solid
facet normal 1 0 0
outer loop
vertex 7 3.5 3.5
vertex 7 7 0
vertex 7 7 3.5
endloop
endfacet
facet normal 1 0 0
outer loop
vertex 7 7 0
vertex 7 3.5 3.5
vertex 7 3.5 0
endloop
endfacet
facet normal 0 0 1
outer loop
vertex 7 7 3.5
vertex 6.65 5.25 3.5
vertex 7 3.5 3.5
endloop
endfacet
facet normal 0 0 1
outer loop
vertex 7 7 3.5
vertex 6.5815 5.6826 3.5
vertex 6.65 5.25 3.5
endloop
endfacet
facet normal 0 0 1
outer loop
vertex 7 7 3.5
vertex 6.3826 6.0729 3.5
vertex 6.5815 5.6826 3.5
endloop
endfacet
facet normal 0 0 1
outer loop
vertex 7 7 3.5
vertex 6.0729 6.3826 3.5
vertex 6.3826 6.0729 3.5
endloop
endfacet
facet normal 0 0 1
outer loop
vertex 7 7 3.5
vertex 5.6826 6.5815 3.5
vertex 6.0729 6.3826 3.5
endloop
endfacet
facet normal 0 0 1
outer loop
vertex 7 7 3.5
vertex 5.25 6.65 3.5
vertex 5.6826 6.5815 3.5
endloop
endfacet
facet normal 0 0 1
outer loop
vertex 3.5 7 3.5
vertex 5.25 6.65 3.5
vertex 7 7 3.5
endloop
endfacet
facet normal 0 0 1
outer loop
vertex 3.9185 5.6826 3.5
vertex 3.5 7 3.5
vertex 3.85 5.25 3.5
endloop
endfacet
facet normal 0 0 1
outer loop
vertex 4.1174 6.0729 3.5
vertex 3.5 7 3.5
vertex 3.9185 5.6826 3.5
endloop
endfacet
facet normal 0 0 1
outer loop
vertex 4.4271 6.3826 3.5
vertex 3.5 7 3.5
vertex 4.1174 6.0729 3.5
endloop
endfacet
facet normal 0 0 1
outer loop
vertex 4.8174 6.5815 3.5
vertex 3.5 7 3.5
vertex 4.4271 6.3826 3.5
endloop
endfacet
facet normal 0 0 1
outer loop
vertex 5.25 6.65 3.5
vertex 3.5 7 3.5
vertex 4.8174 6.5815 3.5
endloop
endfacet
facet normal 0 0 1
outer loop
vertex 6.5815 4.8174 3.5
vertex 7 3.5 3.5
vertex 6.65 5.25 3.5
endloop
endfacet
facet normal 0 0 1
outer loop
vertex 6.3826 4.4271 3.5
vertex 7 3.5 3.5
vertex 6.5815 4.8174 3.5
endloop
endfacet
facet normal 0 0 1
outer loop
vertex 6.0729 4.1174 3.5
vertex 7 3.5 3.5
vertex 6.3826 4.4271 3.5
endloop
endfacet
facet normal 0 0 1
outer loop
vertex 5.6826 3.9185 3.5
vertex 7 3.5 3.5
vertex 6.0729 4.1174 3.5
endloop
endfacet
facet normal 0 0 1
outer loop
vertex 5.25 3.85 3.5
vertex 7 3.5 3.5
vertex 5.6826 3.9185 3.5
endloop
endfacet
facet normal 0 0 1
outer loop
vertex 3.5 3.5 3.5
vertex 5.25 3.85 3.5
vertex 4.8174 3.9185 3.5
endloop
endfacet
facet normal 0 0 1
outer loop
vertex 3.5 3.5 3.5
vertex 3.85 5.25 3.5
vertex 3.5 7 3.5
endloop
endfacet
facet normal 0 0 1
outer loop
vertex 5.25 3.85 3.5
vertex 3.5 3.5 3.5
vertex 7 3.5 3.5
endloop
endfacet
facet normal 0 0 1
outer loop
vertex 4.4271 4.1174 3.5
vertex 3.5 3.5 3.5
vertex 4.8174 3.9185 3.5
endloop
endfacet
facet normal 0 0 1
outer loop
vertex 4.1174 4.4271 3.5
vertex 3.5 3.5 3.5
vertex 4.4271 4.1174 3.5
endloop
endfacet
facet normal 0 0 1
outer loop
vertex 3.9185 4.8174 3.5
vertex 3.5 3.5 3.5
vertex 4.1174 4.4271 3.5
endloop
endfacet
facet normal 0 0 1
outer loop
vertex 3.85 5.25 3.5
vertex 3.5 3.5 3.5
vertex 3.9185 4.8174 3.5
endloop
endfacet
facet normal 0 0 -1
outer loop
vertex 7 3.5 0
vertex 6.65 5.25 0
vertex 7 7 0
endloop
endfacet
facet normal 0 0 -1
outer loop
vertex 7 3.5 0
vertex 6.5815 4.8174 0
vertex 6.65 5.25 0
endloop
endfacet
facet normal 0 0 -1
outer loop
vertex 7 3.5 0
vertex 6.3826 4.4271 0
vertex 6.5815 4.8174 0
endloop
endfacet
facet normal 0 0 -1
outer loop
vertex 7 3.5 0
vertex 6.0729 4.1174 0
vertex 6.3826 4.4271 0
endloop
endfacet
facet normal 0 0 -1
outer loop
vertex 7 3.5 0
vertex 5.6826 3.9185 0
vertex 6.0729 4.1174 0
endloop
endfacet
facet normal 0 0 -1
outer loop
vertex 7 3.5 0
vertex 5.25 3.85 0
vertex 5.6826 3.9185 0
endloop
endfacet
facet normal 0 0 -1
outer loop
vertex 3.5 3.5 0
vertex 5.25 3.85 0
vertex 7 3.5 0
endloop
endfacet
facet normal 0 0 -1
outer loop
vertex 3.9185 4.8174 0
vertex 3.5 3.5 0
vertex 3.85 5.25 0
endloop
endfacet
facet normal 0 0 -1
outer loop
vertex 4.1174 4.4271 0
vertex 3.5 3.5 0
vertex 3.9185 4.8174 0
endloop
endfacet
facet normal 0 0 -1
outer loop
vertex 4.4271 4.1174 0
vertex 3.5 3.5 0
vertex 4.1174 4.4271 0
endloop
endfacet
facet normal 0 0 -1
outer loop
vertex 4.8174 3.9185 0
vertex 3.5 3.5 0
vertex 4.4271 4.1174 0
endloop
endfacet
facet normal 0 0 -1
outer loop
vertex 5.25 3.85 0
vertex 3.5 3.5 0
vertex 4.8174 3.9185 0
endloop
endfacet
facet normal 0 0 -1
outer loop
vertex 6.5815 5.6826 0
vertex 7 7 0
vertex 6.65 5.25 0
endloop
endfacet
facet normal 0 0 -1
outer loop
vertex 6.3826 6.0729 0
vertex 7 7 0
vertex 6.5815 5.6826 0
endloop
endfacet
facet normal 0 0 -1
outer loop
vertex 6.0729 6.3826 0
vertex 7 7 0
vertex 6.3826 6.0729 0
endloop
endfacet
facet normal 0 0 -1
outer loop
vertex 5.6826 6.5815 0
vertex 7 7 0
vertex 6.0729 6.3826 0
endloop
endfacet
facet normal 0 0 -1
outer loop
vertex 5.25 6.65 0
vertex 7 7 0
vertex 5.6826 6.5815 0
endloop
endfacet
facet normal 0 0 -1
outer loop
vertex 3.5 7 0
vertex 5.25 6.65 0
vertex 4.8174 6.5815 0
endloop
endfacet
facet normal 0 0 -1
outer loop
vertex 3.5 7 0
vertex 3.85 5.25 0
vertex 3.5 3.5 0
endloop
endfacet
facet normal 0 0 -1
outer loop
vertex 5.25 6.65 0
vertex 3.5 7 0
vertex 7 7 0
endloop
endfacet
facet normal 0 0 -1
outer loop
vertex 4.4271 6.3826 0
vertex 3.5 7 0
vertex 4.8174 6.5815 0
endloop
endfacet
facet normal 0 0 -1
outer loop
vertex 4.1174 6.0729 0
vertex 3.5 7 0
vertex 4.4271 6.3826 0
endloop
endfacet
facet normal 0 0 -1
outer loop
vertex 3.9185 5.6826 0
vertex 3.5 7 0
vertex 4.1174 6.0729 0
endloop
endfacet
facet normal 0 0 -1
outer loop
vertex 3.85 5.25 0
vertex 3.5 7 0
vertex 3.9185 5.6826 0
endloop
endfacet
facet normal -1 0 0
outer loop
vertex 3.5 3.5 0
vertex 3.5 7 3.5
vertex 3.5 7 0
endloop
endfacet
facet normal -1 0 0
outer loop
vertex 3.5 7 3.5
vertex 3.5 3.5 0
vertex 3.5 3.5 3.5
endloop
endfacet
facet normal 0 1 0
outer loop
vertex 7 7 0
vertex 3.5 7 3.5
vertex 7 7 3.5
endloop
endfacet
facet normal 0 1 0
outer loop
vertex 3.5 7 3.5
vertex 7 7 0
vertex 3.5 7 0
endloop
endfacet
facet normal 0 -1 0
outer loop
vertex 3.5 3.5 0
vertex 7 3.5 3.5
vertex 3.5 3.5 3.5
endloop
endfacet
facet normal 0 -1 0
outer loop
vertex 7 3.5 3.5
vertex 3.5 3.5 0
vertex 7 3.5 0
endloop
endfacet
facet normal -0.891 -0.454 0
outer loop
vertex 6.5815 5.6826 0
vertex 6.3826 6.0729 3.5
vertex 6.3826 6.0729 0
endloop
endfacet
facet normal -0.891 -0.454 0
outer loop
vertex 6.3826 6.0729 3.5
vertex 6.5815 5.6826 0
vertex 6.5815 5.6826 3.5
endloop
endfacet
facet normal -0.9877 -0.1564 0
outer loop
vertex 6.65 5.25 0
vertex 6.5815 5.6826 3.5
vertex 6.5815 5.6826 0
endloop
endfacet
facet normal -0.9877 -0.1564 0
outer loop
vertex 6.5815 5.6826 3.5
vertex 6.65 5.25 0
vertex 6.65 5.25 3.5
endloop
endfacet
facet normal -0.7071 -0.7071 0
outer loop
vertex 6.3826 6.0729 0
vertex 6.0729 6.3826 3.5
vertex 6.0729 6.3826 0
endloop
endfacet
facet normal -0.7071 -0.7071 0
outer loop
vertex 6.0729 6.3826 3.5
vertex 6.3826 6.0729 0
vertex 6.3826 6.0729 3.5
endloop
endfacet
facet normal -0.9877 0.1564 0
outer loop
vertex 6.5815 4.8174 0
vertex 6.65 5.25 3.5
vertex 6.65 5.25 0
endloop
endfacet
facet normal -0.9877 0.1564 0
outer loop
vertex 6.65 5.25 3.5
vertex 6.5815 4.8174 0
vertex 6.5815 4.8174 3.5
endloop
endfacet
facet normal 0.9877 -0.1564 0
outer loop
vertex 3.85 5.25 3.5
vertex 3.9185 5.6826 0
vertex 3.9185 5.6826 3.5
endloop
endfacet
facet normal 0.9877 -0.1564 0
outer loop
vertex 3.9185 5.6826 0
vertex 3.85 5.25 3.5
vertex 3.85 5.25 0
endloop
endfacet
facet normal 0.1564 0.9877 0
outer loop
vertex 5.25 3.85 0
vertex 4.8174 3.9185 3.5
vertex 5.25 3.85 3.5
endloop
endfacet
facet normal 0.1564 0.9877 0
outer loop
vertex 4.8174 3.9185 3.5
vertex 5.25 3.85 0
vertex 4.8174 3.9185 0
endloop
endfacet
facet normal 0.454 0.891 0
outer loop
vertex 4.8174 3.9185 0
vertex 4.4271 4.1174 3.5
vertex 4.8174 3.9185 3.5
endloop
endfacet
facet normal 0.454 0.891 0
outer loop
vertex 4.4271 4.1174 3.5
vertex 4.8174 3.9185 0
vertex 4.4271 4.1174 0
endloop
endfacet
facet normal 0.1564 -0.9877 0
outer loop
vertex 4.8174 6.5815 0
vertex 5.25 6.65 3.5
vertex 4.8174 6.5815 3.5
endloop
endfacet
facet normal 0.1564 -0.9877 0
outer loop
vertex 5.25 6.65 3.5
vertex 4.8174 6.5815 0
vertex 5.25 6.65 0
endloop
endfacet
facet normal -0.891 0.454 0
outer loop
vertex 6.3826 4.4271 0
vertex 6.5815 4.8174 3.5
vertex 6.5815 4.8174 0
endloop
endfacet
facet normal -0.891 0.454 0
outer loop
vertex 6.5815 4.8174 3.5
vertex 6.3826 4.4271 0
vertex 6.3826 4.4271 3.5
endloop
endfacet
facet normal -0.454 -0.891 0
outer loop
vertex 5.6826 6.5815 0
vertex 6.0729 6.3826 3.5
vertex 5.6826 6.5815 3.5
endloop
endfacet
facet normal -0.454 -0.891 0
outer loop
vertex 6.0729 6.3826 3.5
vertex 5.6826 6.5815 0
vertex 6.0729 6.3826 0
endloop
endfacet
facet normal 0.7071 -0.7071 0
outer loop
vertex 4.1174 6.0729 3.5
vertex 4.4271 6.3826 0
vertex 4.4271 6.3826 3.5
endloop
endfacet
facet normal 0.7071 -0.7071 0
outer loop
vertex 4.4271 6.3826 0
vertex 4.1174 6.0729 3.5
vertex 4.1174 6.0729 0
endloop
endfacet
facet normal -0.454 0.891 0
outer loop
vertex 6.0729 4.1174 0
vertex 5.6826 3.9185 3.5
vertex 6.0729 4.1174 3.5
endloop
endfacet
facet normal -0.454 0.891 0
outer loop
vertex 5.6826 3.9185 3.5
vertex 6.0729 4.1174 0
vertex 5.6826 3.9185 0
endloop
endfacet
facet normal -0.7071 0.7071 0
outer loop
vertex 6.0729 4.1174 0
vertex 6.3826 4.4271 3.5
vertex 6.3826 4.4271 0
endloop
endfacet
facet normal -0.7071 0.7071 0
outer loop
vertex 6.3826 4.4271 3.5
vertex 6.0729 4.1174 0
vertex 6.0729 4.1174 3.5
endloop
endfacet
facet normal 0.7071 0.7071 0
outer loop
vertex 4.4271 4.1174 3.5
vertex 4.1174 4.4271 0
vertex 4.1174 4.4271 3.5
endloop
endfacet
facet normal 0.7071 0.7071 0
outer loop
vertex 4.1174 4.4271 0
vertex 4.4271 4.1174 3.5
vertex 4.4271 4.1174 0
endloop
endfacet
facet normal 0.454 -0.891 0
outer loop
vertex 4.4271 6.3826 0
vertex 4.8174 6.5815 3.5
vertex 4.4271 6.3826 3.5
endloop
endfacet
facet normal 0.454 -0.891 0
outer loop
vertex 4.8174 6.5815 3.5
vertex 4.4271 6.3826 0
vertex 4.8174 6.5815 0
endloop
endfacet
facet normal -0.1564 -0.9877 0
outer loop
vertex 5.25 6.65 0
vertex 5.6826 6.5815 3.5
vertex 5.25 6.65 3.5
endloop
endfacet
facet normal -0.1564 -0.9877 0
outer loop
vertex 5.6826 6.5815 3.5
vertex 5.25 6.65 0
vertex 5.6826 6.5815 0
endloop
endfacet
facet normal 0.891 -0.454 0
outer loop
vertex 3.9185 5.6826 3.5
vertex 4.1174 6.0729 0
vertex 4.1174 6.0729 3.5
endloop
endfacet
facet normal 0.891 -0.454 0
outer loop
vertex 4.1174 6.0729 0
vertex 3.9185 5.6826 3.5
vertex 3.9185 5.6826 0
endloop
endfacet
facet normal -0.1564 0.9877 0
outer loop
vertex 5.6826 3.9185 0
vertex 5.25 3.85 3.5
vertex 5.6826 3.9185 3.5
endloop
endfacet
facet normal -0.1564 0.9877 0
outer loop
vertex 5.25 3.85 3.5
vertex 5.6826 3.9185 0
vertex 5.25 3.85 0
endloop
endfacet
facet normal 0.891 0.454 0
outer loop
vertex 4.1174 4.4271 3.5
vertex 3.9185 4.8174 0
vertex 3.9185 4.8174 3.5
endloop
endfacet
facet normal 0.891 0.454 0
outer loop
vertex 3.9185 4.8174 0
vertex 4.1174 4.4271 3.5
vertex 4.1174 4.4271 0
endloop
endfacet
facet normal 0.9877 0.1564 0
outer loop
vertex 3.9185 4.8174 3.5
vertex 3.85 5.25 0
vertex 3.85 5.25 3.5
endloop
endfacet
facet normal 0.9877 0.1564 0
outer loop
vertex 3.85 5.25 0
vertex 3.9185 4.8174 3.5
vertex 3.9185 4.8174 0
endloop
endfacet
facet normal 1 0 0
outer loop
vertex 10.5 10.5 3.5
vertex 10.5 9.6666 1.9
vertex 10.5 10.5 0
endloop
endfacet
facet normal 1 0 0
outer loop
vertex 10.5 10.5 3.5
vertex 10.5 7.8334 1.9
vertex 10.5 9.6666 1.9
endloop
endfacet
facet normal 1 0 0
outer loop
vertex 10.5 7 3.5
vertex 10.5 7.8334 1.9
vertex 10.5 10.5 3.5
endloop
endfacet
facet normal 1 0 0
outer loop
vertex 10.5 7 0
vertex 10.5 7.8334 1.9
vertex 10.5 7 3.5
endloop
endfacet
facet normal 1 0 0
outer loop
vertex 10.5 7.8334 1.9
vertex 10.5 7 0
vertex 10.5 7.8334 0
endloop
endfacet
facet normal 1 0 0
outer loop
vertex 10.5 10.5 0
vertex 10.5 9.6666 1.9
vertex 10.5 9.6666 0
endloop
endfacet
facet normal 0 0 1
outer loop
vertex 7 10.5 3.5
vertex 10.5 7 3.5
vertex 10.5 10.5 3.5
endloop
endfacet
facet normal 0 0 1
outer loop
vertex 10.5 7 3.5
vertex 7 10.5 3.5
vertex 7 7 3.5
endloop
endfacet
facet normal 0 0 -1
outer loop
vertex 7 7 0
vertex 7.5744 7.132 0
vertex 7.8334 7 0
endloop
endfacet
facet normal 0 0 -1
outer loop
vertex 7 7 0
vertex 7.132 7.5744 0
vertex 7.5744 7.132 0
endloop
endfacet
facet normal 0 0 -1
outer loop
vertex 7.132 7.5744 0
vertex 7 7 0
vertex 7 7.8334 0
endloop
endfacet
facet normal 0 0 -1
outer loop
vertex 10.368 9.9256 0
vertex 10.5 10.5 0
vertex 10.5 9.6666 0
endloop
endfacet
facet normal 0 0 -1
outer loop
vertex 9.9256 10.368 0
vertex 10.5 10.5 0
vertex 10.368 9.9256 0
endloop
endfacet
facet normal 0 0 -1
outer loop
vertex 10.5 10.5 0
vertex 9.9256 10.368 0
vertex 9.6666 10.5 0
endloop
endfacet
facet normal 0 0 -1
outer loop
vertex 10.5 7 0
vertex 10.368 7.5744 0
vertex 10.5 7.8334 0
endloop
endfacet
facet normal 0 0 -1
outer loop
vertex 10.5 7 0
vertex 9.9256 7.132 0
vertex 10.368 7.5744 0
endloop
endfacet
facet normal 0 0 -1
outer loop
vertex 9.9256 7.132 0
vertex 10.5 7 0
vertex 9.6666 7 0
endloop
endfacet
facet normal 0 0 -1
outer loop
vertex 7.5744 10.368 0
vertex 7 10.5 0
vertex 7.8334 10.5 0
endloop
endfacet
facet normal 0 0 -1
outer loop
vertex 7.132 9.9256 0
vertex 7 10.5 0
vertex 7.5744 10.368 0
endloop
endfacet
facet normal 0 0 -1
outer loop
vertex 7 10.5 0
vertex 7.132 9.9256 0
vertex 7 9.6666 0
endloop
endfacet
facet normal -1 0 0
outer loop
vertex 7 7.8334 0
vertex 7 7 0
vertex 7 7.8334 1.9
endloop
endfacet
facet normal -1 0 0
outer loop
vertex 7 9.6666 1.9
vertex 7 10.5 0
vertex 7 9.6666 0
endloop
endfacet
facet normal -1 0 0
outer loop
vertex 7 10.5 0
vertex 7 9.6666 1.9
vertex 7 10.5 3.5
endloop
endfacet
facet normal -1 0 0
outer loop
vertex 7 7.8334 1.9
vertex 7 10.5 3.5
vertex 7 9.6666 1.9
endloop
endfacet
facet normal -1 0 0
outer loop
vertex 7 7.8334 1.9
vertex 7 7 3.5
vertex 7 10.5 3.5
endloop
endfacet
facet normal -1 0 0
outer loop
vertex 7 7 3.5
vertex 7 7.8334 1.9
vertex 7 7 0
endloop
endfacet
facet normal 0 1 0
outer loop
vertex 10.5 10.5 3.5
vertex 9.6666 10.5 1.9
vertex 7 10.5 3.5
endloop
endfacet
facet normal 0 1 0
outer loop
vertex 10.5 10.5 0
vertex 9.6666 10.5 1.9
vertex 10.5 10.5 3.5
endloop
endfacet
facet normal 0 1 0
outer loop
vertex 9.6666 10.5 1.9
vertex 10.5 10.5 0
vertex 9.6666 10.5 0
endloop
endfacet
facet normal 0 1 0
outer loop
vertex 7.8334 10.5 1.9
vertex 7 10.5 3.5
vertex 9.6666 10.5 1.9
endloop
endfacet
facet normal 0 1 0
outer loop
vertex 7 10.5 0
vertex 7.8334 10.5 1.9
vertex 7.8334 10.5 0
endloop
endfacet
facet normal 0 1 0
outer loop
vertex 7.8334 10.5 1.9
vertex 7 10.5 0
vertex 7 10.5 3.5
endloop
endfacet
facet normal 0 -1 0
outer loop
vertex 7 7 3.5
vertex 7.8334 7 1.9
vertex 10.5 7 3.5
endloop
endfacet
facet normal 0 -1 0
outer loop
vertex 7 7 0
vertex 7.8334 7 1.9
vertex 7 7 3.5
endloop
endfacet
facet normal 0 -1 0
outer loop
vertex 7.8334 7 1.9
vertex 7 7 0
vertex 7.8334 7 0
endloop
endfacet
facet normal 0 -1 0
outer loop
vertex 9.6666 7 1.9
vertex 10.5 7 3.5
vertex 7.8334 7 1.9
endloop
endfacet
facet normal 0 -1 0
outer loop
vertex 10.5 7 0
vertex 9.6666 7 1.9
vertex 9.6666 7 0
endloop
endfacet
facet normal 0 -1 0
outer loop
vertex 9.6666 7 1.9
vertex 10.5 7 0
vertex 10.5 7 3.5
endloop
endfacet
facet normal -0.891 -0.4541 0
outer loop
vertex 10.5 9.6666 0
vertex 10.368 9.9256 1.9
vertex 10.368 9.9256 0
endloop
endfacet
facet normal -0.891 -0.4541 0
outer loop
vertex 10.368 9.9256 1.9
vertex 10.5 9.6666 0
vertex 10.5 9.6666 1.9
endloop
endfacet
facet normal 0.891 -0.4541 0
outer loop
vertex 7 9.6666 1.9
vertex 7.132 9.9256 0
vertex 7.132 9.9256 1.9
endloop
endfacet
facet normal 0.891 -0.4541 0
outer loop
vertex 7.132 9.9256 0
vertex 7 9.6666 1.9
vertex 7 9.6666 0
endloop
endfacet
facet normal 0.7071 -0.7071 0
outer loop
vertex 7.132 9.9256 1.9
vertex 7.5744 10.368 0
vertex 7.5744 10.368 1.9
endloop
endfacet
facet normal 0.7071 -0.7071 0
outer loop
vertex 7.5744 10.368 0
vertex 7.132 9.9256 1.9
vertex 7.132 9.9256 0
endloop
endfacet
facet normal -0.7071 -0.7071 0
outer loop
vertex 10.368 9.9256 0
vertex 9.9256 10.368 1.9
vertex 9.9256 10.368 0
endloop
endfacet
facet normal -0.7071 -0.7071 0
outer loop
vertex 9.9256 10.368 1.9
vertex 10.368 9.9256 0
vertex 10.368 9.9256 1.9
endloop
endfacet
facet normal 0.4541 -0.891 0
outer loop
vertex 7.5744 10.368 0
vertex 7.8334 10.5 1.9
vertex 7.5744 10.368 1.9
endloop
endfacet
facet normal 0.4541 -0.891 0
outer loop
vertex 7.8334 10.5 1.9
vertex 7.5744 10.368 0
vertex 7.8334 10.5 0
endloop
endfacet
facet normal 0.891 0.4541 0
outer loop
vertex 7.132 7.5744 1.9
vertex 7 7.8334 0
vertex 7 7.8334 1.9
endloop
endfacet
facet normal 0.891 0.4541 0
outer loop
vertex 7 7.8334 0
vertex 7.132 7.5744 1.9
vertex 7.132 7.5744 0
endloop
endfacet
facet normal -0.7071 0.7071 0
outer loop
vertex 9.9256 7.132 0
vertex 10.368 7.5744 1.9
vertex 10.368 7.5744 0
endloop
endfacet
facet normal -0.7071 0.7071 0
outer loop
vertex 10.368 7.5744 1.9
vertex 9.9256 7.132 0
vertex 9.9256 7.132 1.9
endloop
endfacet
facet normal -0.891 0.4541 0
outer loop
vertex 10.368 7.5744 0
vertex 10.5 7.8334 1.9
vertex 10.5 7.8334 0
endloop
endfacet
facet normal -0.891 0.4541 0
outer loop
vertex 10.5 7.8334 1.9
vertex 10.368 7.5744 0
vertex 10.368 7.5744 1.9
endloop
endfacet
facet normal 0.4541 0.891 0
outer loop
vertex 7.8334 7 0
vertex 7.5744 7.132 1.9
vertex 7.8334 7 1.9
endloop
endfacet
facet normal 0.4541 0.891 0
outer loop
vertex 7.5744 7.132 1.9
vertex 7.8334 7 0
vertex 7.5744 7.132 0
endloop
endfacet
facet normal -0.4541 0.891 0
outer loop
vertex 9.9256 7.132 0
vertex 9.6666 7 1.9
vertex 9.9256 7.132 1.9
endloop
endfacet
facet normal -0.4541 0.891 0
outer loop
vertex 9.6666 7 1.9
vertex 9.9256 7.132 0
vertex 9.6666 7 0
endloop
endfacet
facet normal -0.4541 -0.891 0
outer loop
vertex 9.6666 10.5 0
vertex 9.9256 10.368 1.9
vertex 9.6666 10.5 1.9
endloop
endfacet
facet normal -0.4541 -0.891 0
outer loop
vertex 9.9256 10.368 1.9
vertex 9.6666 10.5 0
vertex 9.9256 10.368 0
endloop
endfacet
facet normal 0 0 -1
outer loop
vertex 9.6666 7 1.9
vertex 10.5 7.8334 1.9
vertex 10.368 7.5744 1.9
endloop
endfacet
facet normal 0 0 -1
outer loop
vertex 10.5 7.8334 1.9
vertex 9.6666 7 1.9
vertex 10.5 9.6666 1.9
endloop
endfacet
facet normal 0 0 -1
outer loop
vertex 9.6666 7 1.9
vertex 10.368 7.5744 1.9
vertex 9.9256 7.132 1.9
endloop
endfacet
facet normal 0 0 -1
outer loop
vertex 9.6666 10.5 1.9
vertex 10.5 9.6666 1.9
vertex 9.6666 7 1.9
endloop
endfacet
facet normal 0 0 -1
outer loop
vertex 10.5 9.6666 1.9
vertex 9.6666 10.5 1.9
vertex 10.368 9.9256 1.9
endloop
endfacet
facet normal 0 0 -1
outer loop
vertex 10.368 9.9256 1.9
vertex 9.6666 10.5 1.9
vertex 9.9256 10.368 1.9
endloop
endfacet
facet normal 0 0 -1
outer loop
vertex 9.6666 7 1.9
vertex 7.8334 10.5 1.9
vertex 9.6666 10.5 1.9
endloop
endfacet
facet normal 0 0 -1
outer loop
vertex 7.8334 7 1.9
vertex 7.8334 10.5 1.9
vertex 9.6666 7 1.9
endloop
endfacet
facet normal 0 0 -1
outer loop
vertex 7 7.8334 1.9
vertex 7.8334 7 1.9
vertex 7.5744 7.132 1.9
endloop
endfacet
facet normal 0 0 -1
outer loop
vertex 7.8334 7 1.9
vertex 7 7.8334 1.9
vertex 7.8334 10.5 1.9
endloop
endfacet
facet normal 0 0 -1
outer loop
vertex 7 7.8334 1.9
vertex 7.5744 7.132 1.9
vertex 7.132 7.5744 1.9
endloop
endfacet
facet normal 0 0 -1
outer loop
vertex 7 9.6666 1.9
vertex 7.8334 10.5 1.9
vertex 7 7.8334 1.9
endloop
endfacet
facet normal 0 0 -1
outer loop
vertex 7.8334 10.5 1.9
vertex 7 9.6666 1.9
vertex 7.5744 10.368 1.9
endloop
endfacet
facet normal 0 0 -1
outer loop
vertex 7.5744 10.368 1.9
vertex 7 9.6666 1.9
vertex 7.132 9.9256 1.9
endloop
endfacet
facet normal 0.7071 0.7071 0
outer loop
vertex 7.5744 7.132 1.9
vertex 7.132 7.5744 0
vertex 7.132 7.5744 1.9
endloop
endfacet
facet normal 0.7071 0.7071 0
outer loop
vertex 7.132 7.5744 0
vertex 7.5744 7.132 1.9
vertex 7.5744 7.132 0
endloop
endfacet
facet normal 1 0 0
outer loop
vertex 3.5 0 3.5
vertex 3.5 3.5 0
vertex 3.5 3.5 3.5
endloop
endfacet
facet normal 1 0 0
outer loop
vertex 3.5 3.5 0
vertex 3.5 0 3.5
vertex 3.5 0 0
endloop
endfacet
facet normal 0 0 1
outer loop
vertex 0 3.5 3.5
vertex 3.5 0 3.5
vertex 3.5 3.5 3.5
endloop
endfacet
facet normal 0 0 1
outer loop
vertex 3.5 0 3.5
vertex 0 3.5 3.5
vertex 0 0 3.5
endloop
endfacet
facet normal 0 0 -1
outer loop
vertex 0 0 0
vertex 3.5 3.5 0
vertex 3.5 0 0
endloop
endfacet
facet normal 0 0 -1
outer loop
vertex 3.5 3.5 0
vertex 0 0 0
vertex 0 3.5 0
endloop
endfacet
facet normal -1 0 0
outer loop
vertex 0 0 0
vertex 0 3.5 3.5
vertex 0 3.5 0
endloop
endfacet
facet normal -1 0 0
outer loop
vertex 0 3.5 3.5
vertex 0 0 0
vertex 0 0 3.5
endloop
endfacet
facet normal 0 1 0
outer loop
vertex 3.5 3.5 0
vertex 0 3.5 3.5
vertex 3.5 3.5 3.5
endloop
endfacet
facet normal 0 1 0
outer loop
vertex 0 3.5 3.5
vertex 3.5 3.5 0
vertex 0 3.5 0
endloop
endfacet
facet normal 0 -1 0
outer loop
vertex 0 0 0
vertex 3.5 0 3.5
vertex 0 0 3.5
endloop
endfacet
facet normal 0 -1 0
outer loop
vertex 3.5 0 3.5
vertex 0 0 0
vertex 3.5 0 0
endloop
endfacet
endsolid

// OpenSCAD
module 3dPixel(xpos, ypos, xsi=3.5, ysi, zsi, gap=0.0)
{
    xsize = xsi;
    ysize = (ysi==undef)? xsi : ysi;
    zsize = (zsi==undef)? xsi : zsi;
    translate(v=[xpos*(gap+xsize),ypos*(gap+ysize),0])
    cube(size=[xsize, ysize, zsize]);
}
module RingHole(xpos, ypos, xsi=3.5, ysi, zsi, gap=0.0)
{
    xsize = xsi;
    ysize = (ysi==undef)? xsi : ysi;
    zsize = (zsi==undef)? xsi : zsi;
    difference(){
        3dPixel(xpos, ypos, xsize, ysize, zsize, gap);
        translate(v=[xpos*(gap+xsize)+0.5*xsize,ypos*(gap+ysize)+0.5*ysize,0.5*zsize])
        cylinder(h=1.1*zsize, r=0.4*xsize, $fn=20, center=true);
    }
}
module PixelSteg(x1, y1, x2, y2, rot=45, xsi=3.5, ysi, zsi, gap=0.0)
{
    xsize = xsi;
    ysize = (ysi==undef)? xsi : ysi;
    zsize = (zsi==undef)? xsi : zsi;
    translate(v=[(x1+x2)/2*(gap+xsize)+0.5*xsize,(y1+y2)/2*(gap+ysize)+0.5*ysize,zsize/5/2])
    rotate([0,0,rot])
    cube(size=[((x1!=x2)?max(abs(x1-x2),1):max(abs(y1-y2),1))*xsize, ysize, zsize/5],center=true);
}

module MagnetHole(xpos, ypos, xsi=3.5, ysi, zsi, gap=0.0, magnetHeight = 2.0, magnetDiam = 4.0)
{
    xsize = xsi;
    ysize = (ysi==undef)? xsi : ysi;
    zsize = (zsi==undef)? xsi : zsi;
    translate(v=[xpos*(gap+xsize)+0.5*xsize,ypos*(gap+ysize)+0.5*ysize,magnetHeight/2-magnetHeight*0.1])
    cylinder(h=magnetHeight*1.1, r=magnetDiam/2, $fn=20, center=true);
}

3dPixel(0,0);
RingHole(1,1);
difference()
{
    3dPixel(2,2);
    MagnetHole(2,2);
}
